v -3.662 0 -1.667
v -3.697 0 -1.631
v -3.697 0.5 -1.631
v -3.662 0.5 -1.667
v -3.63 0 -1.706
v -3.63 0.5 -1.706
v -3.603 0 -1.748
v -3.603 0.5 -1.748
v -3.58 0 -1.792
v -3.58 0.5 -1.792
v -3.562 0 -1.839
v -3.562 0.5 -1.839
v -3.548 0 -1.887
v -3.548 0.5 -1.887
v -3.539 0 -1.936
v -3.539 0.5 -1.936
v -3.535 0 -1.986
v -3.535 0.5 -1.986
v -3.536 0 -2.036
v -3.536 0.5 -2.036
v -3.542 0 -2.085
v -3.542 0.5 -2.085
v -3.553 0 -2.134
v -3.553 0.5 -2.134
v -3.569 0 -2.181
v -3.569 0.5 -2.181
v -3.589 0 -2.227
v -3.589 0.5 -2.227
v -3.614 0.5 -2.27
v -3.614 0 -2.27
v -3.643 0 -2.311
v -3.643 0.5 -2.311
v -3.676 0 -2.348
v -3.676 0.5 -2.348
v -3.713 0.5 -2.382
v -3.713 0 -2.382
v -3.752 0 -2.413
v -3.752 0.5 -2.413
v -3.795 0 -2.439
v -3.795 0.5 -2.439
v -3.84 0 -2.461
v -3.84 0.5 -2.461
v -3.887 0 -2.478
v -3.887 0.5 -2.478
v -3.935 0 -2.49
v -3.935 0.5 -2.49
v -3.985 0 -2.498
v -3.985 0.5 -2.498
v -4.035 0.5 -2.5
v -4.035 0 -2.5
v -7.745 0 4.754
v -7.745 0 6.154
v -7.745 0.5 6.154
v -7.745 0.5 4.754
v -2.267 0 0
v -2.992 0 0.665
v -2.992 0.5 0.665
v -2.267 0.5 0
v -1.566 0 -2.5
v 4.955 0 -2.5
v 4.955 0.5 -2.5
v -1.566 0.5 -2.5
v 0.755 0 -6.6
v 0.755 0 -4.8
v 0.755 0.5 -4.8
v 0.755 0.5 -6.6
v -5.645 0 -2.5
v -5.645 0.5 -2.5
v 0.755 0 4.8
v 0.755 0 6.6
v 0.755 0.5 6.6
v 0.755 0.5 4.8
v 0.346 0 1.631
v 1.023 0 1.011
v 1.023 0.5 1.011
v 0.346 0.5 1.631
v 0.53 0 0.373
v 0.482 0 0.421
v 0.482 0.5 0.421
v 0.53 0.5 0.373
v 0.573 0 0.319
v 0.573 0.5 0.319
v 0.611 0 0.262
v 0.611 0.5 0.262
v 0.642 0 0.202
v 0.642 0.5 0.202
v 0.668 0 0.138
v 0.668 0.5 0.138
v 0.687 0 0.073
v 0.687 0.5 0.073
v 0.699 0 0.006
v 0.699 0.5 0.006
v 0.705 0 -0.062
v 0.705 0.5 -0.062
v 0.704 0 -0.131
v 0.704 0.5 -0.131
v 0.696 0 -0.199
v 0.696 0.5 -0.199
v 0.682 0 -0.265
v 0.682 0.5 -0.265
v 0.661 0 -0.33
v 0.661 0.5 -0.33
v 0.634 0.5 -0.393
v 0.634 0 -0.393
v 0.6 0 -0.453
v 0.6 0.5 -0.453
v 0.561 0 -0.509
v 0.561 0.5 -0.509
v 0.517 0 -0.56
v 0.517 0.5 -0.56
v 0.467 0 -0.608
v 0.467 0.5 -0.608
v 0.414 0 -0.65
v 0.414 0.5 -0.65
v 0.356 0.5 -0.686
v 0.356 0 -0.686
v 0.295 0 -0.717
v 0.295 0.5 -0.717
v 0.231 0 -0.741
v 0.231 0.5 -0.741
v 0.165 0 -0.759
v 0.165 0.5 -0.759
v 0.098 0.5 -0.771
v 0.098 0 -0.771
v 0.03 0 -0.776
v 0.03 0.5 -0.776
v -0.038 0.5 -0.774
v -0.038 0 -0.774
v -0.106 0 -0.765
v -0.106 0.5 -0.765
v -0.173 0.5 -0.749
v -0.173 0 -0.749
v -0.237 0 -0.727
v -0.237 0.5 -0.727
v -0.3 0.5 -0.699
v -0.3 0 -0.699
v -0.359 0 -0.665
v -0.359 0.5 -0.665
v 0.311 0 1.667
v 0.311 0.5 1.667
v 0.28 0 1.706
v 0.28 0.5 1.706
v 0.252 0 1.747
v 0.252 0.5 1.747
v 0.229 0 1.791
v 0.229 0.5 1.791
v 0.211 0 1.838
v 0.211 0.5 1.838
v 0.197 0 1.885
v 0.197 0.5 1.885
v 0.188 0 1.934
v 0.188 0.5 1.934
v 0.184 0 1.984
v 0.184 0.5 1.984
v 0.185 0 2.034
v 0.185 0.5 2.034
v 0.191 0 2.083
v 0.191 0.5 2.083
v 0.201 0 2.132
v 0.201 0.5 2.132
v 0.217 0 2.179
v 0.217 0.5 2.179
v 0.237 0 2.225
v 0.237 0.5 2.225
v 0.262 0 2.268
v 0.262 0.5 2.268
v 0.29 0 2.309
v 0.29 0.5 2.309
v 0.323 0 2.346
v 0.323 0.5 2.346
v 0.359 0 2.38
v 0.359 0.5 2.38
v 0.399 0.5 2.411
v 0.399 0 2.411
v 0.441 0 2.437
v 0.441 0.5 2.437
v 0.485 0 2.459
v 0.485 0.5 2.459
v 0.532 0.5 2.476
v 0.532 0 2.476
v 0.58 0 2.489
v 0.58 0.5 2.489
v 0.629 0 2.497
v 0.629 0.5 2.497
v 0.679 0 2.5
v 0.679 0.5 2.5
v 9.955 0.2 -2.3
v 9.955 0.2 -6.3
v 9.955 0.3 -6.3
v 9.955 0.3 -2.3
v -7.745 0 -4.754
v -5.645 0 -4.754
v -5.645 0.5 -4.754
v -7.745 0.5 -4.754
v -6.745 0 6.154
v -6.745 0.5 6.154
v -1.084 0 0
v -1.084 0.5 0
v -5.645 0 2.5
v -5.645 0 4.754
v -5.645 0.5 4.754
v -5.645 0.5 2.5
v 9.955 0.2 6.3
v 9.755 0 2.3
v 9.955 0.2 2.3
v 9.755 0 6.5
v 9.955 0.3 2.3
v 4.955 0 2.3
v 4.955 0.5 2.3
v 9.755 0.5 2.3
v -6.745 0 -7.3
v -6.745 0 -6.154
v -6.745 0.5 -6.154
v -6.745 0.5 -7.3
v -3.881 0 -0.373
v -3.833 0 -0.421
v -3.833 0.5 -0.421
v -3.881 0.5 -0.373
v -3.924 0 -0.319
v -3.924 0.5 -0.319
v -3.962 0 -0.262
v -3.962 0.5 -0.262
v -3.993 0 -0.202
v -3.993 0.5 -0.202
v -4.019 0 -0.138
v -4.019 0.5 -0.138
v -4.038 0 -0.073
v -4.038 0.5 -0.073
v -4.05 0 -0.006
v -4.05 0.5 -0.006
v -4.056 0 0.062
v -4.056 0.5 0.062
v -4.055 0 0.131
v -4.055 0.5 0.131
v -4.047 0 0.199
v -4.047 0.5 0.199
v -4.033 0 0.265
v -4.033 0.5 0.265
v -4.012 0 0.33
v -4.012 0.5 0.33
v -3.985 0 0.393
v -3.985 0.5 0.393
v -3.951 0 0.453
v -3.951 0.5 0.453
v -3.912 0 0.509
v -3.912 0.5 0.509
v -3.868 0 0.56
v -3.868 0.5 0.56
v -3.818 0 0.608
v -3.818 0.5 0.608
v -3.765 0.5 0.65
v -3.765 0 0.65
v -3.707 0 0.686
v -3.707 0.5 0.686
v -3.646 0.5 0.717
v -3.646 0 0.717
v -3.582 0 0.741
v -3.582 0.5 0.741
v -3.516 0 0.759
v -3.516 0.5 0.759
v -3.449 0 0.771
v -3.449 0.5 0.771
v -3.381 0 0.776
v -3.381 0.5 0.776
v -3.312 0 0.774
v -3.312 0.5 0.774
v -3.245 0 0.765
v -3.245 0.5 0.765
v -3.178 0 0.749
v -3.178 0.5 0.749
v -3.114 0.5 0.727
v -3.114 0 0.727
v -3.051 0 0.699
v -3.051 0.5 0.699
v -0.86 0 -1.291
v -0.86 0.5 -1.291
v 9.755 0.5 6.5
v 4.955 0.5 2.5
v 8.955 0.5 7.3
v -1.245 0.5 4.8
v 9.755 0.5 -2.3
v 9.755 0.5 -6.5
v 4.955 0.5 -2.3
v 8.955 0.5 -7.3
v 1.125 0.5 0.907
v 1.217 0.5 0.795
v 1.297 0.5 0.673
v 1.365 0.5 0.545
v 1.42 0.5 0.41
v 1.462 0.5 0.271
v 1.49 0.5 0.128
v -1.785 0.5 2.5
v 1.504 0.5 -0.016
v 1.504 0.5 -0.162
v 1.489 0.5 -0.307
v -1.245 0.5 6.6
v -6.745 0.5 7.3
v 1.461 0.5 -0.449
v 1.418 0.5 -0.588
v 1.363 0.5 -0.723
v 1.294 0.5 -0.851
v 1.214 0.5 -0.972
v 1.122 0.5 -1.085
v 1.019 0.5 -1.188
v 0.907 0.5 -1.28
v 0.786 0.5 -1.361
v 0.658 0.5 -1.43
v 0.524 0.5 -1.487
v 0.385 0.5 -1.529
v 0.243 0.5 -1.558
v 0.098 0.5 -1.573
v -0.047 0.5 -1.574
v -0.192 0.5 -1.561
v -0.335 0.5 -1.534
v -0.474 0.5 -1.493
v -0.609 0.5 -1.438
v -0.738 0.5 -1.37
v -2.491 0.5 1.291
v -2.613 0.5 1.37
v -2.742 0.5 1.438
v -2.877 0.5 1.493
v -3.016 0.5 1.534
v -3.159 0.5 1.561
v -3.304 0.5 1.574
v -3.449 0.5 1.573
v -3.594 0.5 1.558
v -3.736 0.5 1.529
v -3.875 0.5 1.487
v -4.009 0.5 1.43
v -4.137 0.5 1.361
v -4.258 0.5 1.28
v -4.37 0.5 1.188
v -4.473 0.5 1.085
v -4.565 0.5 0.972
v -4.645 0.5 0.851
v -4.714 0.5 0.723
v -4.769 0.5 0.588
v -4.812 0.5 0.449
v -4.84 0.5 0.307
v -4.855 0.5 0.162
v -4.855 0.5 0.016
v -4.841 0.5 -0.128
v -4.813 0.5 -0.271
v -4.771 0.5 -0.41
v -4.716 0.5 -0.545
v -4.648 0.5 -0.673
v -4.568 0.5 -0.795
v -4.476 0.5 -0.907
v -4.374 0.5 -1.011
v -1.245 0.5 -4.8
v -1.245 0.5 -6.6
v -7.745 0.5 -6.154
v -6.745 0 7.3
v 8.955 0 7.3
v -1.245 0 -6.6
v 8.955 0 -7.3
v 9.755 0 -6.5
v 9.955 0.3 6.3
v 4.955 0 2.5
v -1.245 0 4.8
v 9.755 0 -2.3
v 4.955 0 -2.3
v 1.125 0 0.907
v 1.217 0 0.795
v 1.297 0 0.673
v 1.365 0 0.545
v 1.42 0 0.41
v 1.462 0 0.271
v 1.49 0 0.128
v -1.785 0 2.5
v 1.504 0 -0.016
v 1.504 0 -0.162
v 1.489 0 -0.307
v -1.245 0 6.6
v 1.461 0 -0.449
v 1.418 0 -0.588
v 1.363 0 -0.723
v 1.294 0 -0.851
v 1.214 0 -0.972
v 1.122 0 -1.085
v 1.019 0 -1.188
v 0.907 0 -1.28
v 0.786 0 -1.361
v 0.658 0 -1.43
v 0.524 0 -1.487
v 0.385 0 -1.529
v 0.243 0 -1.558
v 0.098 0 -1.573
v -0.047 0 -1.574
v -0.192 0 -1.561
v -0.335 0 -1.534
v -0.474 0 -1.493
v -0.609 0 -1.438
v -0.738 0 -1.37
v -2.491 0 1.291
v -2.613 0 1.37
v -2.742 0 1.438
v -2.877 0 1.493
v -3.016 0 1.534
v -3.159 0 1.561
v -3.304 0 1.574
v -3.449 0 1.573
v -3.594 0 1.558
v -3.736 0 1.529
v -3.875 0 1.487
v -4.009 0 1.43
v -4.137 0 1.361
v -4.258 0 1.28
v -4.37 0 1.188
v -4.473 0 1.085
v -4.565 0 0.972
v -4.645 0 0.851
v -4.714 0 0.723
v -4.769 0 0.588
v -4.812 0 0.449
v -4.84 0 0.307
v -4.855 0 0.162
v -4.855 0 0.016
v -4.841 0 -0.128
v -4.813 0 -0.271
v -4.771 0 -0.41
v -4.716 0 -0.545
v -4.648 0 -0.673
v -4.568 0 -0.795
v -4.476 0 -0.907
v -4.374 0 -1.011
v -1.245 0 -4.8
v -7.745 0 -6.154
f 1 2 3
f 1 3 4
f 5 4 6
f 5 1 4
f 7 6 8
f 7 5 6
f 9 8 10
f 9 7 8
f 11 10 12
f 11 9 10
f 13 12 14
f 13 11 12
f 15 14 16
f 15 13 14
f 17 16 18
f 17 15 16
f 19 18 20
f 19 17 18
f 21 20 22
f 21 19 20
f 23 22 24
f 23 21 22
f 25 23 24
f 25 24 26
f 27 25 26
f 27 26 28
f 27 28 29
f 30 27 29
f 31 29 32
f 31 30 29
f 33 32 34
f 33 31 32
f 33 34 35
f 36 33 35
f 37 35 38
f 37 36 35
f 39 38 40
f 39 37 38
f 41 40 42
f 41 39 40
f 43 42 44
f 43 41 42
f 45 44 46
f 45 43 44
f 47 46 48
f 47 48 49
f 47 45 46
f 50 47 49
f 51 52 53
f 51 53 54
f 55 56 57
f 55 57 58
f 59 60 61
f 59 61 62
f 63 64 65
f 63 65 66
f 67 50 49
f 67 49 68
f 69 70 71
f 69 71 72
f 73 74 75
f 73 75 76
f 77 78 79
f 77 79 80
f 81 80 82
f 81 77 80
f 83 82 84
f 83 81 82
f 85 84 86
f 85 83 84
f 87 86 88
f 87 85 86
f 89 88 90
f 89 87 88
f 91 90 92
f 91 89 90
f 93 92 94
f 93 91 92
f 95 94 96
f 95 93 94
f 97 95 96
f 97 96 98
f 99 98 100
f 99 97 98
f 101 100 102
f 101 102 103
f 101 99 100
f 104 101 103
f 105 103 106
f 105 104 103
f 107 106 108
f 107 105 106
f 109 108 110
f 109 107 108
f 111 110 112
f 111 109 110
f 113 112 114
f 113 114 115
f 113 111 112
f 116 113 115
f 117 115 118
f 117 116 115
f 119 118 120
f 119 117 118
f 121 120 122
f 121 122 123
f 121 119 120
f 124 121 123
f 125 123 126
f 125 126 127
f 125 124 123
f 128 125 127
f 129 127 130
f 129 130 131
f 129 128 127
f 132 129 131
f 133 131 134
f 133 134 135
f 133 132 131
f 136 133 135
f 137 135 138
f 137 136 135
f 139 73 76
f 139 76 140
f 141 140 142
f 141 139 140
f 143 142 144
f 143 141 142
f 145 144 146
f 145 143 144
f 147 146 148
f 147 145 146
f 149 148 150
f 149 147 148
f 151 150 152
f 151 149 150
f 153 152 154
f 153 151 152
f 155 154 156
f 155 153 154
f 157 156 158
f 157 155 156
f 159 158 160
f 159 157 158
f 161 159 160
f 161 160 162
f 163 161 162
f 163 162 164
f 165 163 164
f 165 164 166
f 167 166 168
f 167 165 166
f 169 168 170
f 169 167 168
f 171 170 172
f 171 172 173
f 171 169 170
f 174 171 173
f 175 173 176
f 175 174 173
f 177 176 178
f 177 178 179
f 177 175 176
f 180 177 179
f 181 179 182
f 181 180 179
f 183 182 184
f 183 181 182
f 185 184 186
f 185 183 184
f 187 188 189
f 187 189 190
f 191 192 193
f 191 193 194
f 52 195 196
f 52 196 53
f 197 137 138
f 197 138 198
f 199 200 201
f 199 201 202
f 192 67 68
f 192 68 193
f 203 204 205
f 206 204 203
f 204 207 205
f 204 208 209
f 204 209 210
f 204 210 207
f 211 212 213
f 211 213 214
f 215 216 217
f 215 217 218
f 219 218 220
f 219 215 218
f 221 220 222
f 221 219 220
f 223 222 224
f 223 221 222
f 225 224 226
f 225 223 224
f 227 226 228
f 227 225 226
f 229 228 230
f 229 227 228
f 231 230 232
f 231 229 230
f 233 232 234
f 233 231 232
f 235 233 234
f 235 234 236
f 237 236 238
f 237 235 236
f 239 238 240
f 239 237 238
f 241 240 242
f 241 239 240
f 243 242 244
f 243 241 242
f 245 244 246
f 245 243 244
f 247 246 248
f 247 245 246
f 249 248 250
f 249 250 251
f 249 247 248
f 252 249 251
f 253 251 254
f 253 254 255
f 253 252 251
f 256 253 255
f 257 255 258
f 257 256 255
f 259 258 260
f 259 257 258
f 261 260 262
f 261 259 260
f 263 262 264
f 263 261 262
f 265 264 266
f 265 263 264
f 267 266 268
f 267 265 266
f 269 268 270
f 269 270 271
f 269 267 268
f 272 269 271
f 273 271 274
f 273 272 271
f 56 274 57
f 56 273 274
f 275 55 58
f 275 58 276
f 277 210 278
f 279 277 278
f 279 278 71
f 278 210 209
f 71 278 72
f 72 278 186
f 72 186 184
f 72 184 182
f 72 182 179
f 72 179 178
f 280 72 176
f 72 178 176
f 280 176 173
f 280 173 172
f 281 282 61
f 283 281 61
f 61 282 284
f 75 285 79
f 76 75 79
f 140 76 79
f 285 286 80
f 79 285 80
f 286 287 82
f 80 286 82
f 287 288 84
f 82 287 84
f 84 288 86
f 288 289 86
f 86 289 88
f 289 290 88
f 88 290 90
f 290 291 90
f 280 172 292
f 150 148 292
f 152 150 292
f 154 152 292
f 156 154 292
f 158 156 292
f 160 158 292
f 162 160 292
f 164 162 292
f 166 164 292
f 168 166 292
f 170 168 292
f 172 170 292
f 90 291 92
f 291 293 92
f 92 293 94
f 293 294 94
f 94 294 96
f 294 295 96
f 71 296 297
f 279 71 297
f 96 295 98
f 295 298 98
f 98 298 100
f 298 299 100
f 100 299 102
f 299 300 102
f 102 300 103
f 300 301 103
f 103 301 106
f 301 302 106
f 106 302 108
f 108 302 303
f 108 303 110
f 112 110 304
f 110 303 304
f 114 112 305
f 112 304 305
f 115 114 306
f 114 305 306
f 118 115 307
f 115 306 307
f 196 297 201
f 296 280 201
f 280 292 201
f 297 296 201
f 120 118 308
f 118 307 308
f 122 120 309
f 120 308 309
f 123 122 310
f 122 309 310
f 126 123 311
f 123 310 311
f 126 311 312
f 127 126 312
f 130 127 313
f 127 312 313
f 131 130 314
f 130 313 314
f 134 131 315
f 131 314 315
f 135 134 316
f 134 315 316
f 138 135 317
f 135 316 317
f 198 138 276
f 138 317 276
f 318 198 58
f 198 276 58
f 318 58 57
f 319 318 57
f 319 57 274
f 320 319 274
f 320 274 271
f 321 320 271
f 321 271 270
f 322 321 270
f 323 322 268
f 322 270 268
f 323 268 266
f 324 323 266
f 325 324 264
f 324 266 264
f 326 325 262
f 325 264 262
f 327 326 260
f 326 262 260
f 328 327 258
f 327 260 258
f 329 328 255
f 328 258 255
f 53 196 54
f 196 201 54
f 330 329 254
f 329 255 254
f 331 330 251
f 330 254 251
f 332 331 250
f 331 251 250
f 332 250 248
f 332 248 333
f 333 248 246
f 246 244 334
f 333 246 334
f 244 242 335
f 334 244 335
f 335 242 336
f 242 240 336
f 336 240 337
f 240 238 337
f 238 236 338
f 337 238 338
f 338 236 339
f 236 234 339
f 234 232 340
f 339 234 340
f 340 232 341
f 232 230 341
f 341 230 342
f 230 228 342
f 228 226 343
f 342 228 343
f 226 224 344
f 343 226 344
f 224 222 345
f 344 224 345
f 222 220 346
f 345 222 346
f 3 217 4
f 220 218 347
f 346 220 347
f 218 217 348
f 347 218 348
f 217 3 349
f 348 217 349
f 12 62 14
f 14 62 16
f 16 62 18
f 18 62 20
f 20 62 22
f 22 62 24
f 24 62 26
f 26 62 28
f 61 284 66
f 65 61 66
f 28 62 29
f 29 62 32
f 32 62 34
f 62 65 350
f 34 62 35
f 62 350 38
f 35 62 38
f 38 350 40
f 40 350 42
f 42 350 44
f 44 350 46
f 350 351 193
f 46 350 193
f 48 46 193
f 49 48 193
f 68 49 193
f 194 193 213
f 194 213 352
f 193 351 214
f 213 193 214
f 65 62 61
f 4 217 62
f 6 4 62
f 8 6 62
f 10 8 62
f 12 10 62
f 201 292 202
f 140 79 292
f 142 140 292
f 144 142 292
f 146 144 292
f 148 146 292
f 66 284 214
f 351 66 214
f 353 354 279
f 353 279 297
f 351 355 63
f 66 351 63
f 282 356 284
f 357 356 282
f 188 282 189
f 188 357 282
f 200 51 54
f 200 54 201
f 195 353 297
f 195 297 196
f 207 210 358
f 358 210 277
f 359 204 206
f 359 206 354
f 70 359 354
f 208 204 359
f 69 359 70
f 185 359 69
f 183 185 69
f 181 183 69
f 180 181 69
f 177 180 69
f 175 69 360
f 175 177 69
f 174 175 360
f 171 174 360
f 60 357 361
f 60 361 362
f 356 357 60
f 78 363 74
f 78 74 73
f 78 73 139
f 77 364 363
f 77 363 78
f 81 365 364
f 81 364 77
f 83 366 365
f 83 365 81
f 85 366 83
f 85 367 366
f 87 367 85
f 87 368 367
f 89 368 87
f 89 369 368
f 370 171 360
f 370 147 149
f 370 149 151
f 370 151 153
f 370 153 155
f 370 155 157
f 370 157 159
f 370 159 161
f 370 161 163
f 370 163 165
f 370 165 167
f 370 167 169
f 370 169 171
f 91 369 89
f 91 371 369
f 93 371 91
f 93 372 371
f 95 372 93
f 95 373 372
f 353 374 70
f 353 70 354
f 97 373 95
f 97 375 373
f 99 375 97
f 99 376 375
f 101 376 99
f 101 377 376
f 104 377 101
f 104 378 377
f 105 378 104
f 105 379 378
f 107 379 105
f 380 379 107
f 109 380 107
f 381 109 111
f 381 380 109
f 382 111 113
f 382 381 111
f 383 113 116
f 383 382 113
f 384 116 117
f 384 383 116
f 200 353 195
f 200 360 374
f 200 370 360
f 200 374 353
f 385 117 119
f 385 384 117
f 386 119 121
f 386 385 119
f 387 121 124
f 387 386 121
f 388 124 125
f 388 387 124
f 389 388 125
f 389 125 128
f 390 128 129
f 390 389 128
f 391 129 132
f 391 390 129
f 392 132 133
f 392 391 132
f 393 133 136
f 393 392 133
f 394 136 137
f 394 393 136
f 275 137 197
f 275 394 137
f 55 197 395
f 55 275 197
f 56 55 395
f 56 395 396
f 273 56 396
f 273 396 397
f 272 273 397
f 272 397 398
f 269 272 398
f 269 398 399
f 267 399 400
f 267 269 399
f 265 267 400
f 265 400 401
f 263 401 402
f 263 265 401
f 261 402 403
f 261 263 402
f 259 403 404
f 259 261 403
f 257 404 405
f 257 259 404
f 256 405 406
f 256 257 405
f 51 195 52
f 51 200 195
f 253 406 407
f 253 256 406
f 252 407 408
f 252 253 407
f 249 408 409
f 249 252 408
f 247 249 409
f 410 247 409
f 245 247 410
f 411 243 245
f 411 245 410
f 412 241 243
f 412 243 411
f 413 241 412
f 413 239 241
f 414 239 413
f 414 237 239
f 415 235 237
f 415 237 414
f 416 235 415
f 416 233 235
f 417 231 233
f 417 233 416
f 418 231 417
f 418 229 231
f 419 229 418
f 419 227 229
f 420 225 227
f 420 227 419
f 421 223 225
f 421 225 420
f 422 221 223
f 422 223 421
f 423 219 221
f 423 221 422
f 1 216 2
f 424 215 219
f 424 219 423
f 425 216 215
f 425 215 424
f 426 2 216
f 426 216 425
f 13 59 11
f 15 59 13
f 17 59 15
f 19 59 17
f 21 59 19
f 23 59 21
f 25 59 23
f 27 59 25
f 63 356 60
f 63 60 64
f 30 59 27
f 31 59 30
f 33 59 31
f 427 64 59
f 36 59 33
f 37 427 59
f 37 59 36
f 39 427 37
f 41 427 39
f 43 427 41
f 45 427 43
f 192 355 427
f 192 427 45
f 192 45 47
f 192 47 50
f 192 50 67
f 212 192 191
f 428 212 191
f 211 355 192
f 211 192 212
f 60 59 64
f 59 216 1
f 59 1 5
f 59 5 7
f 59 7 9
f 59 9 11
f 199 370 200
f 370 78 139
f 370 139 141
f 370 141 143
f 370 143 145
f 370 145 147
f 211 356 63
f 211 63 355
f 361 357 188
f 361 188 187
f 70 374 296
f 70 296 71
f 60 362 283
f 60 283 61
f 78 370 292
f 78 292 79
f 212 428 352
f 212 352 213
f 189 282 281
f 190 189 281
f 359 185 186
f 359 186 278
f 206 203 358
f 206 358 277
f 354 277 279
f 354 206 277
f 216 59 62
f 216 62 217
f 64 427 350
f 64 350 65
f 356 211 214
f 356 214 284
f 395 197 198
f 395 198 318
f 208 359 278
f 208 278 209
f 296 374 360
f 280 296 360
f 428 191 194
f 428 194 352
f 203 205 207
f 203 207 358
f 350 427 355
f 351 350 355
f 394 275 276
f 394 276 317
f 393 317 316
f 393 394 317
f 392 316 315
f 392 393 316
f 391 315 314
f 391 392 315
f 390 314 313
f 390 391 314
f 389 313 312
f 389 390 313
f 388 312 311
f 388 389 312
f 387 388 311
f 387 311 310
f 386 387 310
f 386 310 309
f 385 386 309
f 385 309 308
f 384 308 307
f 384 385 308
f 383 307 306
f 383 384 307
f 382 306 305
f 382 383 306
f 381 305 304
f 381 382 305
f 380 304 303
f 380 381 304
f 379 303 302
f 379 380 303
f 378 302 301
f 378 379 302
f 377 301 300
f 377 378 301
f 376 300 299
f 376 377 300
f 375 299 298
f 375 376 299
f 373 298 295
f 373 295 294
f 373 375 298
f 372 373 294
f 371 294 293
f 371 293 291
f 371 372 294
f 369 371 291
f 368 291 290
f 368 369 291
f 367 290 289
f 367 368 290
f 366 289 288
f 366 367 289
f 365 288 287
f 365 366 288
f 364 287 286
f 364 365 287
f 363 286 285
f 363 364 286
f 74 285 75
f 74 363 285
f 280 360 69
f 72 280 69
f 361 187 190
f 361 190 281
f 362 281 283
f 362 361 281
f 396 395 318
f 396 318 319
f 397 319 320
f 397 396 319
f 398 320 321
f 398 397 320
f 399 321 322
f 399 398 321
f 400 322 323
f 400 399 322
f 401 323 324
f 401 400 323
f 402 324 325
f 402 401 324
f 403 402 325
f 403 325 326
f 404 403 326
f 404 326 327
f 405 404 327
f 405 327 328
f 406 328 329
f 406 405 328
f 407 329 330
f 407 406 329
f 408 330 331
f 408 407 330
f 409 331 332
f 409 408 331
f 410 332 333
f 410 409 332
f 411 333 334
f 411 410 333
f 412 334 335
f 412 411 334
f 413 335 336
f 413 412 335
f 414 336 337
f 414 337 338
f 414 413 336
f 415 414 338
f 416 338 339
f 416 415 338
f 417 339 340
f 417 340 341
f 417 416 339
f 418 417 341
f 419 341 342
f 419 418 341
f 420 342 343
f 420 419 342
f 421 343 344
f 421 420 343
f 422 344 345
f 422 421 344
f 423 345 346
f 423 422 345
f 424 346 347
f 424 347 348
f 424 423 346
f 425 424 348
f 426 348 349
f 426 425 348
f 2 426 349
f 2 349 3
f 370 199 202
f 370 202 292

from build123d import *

# Parameters (mm, degrees)
SKETCH1_W           = 2
SKETCH1_H           = 1.8
BOSS_EXTRUDE1_DEPTH = 0.5
CHAMFER1_SIZE       = 0.2


with BuildPart() as part:
    # Sketch1 → Boss-Extrude1 (new body)
    with BuildSketch(Plane(origin=(0, 0, 0), x_dir=(1, 0, 0), z_dir=(0, 1, 0))):
        with BuildLine():
            Line((-6.744590168, 7.3), (8.955409832, 7.3))
            Line((8.955409832, 7.3), (9.955409832, 6.3))
            Line((9.955409832, 6.3), (9.955409832, 2.3))
            Line((9.955409832, 2.3), (4.955409832, 2.3))
            Line((4.955409832, 2.3), (4.955409832, 2.5))
            Line((4.955409832, 2.5), (-1.565729119, 2.5))
            Line((-1.565729119, 2.5), (-3.83310718, 0.421156991))
            ThreePointArc((-3.83310718, 0.421156991), (-3.912248176, -0.508574312), (-2.992299199, -0.664643125))
            Line((-2.992299199, -0.664643125), (-2.267378061, 0))
            Line((-2.267378061, 0), (-0.859569395, 1.290747782))
            ThreePointArc((-0.859569395, 1.290747782), (1.169124512, 1.029390936), (1.022775524, -1.010826784))
            Line((1.022775524, -1.010826784), (0.345859604, -1.63145638))
            ThreePointArc((0.345859604, -1.63145638), (0.216903786, -2.179100893), (0.679037836, -2.5))
            Line((0.679037836, -2.5), (4.955409832, -2.5))
            Line((4.955409832, -2.5), (4.955409832, -2.3))
            Line((4.955409832, -2.3), (9.955409832, -2.3))
            Line((9.955409832, -2.3), (9.955409832, -6.3))
            Line((9.955409832, -6.3), (8.955409832, -7.3))
            Line((8.955409832, -7.3), (-6.744590168, -7.3))
            Line((-6.744590168, -7.3), (-6.744590168, -6.153555701))
            Line((-6.744590168, -6.153555701), (-7.744590168, -6.153555701))
            Line((-7.744590168, -6.153555701), (-7.744590168, -4.753555701))
            Line((-7.744590168, -4.753555701), (-5.644590168, -4.753555701))
            Line((-5.644590168, -4.753555701), (-5.644590168, -2.5))
            Line((-5.644590168, -2.5), (-1.785240618, -2.5))
            Line((-1.785240618, -2.5), (0.482137442, -0.421156991))
            ThreePointArc((0.482137442, -0.421156991), (0.561278438, 0.508574312), (-0.358670538, 0.664643125))
            Line((-0.358670538, 0.664643125), (-1.083591677, 0))
            Line((-1.083591677, 0), (-2.491400342, -1.290747782))
            ThreePointArc((-2.491400342, -1.290747782), (-4.52009425, -1.029390936), (-4.373745262, 1.010826784))
            Line((-4.373745262, 1.010826784), (-3.696829341, 1.63145638))
            ThreePointArc((-3.696829341, 1.63145638), (-3.568749704, 2.181284569), (-4.034728143, 2.5))
            Line((-4.034728143, 2.5), (-5.644590168, 2.5))
            Line((-5.644590168, 2.5), (-5.644590168, 4.753555701))
            Line((-5.644590168, 4.753555701), (-7.744590168, 4.753555701))
            Line((-7.744590168, 4.753555701), (-7.744590168, 6.153555701))
            Line((-7.744590168, 6.153555701), (-6.744590168, 6.153555701))
            Line((-6.744590168, 6.153555701), (-6.744590168, 7.3))
        make_face()
        with Locations((-0.244590168, 5.7)):
            Rectangle(SKETCH1_W, SKETCH1_H, mode=Mode.SUBTRACT)
        with Locations((-0.244590168, -5.7)):
            Rectangle(SKETCH1_W, SKETCH1_H, mode=Mode.SUBTRACT)
    extrude(amount=BOSS_EXTRUDE1_DEPTH)

    # Chamfer1
    chamfer1_edges = [part.edges().sort_by_distance(p)[0] for p in [
        (9.955409832, 0.5, -4.3),
        (9.955409832, 0, -4.3),
        (9.955409832, 0, 4.3),
        (9.955409832, 0.5, 4.3),
    ]]
    chamfer(chamfer1_edges, length=CHAMFER1_SIZE)


solid = part.part
